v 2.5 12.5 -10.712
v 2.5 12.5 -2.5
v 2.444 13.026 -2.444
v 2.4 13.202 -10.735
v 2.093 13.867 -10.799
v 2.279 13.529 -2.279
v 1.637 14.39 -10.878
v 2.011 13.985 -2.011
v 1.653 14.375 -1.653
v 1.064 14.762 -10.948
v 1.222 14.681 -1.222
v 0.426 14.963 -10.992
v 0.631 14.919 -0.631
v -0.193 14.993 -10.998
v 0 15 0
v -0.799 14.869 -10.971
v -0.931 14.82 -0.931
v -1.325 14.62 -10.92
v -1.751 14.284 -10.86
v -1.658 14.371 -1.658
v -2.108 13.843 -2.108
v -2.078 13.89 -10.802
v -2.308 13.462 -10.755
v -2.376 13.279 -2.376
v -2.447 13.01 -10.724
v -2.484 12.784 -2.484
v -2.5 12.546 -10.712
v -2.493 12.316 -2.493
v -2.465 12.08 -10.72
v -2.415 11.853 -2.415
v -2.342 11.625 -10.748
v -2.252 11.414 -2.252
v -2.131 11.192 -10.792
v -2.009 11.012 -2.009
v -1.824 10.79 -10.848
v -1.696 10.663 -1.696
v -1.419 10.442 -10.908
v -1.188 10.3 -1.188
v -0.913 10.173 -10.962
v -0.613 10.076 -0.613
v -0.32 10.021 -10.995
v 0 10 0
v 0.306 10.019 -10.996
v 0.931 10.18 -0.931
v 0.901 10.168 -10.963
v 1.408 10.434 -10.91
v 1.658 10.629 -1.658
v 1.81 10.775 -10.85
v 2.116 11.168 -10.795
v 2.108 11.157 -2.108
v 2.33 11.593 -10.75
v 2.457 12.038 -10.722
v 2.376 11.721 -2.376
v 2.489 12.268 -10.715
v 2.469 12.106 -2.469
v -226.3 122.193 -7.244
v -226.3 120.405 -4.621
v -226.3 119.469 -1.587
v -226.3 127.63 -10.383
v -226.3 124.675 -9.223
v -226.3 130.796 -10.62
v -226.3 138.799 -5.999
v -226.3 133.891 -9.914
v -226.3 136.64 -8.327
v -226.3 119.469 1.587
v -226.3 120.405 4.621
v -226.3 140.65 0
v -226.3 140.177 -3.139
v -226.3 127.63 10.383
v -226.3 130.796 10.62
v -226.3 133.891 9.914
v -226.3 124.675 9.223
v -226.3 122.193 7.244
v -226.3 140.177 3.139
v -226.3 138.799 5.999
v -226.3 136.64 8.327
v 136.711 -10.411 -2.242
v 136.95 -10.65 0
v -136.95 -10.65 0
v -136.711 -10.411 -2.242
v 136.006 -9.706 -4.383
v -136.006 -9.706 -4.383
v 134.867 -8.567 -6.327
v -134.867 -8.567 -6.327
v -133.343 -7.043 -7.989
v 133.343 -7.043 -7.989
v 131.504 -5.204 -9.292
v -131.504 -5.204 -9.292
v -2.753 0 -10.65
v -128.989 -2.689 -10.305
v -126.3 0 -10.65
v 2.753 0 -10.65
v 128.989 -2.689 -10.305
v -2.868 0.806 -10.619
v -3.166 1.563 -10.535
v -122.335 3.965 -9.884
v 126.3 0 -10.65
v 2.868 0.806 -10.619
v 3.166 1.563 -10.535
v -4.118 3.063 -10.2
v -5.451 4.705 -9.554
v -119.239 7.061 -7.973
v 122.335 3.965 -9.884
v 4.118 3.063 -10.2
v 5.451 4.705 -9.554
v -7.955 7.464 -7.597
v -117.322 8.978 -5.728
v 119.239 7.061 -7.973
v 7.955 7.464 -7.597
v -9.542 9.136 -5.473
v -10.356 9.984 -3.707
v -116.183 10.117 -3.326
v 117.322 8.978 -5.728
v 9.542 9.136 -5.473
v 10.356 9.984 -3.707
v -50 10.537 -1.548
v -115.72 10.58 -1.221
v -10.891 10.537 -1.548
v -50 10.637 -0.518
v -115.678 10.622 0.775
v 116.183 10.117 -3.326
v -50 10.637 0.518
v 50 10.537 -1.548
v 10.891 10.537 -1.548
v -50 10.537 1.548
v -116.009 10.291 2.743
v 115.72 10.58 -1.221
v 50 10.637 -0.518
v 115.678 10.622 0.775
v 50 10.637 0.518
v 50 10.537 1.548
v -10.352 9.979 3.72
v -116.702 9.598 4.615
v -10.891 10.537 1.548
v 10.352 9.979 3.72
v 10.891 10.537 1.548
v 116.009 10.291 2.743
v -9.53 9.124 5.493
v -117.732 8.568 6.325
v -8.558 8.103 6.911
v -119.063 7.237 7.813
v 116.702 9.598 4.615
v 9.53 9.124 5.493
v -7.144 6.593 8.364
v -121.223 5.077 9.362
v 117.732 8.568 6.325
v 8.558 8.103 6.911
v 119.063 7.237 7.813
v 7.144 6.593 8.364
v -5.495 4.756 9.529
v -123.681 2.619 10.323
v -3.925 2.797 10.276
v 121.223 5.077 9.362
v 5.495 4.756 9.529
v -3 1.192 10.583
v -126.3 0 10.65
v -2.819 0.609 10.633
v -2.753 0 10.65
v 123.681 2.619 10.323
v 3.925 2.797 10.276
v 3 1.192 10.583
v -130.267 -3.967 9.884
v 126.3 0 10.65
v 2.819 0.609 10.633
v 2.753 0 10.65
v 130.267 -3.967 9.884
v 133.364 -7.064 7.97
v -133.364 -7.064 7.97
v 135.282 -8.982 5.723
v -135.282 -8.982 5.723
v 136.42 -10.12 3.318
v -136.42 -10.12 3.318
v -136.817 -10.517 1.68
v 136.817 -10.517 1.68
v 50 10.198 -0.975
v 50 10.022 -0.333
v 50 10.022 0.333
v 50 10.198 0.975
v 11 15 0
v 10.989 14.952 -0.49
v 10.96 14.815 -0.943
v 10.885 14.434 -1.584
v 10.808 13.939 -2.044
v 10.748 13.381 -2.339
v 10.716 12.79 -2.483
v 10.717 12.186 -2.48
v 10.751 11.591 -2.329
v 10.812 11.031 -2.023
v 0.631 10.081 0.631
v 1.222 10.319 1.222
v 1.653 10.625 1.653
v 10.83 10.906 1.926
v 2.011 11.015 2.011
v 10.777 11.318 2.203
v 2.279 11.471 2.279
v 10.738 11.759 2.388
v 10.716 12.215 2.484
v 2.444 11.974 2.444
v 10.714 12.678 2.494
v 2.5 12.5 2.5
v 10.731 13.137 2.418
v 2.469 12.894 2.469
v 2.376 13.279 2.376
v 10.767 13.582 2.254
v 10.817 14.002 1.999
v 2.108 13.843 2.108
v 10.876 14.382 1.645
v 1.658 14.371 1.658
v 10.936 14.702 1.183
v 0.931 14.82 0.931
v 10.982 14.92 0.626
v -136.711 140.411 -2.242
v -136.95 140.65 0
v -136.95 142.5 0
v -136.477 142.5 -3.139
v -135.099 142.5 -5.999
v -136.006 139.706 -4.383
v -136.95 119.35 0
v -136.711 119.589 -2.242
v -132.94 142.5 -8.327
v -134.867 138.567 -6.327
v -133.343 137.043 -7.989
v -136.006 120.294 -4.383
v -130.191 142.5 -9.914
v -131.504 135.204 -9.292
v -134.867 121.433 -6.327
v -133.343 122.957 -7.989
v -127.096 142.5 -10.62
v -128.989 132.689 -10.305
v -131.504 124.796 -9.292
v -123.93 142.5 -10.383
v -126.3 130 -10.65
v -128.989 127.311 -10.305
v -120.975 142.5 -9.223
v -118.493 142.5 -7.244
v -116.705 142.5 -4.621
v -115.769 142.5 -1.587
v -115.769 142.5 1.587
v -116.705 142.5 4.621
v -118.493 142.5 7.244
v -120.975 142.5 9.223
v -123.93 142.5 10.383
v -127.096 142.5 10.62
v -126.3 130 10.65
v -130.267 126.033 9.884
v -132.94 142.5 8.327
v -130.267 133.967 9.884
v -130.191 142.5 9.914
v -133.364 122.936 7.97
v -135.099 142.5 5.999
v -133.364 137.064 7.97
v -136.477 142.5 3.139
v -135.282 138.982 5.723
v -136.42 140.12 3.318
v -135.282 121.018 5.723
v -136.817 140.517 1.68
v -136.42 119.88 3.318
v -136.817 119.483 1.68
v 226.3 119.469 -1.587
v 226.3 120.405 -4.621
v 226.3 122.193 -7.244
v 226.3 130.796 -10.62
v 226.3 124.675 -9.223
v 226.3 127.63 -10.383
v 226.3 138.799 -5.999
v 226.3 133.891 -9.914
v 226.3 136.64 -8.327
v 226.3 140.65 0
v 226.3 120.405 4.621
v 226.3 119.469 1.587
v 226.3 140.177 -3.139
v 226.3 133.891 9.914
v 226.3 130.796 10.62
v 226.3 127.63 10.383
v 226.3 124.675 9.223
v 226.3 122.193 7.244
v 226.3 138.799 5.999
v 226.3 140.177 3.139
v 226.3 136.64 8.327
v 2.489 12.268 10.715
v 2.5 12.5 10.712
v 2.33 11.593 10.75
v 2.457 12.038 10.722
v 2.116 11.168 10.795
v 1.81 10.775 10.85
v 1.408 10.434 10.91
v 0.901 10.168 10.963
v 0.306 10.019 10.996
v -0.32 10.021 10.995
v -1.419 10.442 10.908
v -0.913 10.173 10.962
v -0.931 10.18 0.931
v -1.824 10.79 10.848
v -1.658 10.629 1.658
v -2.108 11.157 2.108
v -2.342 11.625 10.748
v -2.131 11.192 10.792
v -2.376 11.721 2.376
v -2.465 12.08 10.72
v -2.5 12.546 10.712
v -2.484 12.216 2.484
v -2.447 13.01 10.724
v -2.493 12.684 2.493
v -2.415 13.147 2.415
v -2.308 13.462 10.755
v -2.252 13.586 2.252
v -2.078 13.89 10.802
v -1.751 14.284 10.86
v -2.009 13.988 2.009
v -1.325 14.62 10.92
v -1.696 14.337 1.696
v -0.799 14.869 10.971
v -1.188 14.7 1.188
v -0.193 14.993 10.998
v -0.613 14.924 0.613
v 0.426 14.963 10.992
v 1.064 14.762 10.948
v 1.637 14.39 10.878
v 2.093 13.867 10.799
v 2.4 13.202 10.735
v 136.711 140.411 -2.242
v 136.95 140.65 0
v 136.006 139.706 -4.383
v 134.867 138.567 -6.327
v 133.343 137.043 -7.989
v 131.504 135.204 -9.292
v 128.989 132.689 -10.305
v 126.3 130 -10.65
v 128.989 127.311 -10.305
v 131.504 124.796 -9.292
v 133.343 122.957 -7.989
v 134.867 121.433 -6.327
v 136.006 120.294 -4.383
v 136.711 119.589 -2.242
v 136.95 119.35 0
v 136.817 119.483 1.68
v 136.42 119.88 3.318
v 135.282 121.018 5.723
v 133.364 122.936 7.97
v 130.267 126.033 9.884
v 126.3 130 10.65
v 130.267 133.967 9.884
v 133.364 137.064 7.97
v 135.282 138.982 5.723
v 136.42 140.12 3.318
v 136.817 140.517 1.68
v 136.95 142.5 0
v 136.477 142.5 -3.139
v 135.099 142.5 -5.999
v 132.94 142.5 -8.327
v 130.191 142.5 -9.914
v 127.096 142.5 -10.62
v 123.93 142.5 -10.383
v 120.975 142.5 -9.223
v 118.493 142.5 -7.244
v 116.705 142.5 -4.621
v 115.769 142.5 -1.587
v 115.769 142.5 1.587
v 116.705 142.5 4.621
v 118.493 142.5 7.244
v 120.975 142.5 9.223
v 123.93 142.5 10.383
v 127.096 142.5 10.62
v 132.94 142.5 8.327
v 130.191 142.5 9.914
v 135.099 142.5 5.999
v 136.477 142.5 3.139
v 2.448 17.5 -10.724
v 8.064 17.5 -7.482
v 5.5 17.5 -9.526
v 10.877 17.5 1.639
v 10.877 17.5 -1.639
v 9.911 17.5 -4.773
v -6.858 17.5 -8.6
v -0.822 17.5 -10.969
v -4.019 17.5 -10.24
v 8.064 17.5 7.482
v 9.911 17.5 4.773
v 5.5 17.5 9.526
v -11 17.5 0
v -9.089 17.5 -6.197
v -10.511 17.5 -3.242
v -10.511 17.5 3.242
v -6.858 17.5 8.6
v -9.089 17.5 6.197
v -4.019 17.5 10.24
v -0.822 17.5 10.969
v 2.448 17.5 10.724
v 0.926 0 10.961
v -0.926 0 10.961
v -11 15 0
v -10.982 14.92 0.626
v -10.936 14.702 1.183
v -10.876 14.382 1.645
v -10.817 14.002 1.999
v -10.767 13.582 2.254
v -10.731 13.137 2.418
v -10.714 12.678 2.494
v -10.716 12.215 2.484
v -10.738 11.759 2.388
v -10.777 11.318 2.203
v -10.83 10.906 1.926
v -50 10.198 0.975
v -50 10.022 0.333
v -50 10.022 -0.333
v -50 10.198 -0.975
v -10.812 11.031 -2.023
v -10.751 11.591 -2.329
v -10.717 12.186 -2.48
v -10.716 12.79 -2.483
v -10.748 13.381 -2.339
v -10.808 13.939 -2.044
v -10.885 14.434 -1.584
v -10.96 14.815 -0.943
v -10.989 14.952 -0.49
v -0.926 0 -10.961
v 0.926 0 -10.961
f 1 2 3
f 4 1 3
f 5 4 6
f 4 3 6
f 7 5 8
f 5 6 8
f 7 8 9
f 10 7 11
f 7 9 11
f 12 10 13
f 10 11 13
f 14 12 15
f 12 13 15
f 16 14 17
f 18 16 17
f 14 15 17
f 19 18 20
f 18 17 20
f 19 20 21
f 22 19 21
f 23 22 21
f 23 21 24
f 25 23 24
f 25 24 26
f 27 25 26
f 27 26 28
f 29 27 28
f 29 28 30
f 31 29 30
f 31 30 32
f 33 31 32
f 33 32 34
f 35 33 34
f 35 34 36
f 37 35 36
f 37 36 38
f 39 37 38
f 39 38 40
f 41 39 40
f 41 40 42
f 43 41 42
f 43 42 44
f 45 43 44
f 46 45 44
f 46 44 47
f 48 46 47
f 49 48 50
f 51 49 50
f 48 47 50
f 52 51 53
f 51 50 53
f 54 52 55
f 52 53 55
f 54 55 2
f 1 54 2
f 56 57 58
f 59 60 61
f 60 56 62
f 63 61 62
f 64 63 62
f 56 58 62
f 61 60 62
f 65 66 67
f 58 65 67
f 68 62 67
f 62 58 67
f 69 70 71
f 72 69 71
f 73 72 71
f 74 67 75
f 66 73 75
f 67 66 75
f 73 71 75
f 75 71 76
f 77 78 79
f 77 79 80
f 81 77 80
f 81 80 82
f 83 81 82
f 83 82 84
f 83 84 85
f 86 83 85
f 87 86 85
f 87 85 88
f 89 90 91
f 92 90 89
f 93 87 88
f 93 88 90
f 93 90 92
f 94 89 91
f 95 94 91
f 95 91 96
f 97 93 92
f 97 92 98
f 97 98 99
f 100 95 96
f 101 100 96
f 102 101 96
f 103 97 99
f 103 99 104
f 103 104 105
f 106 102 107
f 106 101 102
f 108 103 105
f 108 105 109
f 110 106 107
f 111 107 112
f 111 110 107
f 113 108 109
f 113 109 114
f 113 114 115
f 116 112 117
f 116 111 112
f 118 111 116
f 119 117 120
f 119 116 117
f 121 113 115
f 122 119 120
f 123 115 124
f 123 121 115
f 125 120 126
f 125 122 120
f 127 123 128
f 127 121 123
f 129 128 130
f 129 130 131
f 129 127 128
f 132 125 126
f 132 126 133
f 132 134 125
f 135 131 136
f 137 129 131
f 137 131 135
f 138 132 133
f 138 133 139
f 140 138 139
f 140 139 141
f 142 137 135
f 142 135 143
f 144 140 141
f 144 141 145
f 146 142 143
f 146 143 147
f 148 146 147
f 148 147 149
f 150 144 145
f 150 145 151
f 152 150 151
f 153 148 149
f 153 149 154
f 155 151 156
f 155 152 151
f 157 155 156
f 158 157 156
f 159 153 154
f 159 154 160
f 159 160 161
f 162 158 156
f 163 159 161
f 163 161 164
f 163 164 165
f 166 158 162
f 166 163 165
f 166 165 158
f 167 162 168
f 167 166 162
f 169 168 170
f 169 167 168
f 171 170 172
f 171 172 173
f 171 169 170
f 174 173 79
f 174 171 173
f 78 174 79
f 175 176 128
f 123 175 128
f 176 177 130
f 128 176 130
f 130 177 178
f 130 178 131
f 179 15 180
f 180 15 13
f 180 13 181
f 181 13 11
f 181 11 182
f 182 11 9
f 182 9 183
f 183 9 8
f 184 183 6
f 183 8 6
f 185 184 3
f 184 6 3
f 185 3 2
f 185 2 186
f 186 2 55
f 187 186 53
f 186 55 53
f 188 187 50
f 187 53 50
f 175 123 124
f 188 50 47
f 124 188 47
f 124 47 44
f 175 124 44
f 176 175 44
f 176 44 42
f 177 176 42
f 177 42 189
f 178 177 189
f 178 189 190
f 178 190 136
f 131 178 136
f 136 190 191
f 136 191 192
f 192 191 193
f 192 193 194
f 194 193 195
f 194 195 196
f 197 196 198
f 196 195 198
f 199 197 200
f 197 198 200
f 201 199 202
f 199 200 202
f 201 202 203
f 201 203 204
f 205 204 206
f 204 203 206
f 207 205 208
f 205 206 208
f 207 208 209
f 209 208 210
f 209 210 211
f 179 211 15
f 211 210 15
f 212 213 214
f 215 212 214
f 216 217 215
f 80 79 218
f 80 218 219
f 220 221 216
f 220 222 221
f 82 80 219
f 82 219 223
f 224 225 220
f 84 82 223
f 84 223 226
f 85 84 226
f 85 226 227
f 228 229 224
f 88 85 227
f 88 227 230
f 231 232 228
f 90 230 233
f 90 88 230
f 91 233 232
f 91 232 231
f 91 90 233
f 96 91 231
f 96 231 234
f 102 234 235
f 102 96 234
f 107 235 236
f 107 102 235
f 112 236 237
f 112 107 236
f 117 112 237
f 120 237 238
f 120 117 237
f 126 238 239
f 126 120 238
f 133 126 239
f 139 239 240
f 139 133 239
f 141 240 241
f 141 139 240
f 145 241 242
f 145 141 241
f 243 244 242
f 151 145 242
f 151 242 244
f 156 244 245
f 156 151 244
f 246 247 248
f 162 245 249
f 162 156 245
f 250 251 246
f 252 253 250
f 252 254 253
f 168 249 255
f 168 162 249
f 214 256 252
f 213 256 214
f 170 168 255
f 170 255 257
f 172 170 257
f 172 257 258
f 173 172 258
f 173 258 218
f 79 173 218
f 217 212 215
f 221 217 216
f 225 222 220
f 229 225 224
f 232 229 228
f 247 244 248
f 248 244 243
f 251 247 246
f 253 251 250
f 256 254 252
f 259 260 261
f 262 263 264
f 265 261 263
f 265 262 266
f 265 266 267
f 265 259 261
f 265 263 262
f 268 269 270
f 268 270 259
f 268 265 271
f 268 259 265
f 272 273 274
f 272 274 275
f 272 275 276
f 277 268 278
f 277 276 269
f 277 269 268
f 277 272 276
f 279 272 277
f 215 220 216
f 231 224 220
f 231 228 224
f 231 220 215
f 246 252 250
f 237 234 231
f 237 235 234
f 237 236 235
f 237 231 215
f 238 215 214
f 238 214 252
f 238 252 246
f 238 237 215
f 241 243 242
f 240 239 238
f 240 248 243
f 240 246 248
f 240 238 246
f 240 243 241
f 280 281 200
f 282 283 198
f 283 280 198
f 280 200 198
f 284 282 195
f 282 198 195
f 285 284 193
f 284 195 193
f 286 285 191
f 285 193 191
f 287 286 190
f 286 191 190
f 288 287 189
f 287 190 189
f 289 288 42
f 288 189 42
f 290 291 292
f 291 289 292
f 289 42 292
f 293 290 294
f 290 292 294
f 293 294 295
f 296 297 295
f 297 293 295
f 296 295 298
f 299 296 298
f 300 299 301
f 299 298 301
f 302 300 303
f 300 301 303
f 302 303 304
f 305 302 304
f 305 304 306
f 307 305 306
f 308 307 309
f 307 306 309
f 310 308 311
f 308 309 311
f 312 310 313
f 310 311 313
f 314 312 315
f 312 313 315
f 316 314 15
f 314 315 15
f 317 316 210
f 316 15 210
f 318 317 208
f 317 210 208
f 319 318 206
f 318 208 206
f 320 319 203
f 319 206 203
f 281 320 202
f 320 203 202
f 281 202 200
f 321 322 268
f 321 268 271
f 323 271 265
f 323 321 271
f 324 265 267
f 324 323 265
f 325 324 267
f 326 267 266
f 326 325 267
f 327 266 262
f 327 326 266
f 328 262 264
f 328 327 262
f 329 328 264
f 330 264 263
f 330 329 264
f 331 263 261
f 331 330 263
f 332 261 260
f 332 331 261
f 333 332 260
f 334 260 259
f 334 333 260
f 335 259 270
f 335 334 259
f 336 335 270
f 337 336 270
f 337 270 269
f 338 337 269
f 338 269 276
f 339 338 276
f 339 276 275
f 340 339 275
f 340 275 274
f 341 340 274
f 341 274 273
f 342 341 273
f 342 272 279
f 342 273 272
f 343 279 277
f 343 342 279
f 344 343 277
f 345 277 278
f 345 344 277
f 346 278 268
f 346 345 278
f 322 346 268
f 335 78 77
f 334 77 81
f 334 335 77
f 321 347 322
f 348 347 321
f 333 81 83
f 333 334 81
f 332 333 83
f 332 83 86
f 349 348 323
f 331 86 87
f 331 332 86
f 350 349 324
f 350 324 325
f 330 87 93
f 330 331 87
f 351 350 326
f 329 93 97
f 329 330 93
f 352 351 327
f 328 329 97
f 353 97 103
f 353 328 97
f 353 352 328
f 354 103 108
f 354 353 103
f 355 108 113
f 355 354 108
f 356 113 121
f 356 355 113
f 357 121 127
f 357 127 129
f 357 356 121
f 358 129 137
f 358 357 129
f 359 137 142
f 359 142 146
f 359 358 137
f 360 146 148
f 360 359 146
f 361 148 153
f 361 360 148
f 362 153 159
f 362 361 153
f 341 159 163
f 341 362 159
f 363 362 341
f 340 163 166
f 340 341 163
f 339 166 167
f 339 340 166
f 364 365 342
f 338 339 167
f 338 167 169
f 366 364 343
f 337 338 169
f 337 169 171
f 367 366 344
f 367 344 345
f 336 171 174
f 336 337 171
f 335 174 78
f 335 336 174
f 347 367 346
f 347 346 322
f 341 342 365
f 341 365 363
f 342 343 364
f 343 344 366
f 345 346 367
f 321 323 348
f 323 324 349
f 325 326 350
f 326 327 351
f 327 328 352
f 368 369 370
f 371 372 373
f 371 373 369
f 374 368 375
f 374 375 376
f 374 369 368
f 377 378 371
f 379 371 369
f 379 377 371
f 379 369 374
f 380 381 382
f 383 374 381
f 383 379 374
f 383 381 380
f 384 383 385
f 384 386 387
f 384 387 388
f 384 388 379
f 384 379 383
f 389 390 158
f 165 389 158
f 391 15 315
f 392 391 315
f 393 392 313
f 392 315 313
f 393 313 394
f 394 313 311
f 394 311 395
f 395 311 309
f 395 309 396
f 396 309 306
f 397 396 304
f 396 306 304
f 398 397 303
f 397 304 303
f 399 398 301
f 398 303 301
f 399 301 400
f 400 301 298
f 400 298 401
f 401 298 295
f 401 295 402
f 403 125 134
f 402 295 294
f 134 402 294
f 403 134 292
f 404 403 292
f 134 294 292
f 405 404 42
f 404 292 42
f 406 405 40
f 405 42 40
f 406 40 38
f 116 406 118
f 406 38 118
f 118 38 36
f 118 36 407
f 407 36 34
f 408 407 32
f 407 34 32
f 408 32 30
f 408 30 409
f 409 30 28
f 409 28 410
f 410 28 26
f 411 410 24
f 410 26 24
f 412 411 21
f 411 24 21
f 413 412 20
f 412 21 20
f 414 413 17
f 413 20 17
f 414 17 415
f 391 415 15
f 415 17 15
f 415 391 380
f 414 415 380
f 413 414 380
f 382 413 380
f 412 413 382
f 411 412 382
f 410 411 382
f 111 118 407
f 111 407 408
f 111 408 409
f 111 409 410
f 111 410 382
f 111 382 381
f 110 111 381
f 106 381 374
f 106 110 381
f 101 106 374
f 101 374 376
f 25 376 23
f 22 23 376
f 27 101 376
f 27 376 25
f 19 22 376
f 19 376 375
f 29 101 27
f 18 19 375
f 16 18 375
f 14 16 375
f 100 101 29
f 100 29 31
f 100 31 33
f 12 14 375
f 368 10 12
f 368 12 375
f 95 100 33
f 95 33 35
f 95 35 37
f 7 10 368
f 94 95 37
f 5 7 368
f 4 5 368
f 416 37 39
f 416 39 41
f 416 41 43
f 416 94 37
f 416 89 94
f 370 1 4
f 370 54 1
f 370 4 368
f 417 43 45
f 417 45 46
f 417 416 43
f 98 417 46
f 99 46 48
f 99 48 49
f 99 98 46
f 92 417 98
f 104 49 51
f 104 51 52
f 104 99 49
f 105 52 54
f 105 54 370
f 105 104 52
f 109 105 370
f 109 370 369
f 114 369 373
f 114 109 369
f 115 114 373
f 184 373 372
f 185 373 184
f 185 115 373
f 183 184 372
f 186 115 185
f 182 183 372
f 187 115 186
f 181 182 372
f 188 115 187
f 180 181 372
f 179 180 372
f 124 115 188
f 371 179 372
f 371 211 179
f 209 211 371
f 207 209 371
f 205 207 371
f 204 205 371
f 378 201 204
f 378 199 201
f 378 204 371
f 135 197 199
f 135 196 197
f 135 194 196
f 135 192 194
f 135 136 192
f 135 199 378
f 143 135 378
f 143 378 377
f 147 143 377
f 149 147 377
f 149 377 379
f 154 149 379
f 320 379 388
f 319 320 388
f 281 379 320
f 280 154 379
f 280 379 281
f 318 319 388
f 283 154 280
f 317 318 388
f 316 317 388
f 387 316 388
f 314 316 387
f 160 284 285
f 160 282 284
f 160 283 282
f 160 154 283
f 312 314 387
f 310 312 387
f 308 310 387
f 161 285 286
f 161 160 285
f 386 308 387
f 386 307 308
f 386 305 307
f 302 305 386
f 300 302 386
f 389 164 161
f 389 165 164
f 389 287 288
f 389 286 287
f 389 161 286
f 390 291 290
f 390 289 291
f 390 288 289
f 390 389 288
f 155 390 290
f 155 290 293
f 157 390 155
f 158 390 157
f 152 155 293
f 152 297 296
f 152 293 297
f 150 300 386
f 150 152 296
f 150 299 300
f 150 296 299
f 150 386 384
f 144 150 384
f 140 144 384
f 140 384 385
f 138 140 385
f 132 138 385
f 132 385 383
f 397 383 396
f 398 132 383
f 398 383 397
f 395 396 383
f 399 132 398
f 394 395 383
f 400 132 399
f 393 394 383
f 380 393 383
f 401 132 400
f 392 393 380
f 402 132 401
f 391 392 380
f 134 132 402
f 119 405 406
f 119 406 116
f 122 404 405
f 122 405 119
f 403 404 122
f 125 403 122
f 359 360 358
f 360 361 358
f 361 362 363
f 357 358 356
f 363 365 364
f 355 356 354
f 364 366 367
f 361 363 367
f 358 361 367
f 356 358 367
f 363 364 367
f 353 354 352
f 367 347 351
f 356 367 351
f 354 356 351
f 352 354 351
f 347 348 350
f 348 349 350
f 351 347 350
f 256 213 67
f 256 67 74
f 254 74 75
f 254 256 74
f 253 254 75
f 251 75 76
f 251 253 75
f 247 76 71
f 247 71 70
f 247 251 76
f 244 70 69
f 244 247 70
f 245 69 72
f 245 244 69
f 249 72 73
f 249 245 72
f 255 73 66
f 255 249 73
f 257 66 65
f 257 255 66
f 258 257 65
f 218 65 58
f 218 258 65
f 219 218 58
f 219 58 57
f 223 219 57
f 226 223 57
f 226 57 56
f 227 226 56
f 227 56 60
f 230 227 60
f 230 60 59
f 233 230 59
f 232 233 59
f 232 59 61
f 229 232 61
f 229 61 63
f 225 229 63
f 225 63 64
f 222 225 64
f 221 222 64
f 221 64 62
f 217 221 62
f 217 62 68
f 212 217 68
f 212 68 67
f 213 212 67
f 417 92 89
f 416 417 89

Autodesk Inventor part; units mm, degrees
sketch "Sketch1" plane through (0, 0, 0) normal (0, 0, 1) x (1, 0, 0)
  line L0 (-126.3, 0) -> (126.3, 0)
  line L1 (126.3, 0) -> (126.3, 142.5)
  line L2 (126.3, 0) -> (268.8, 0) construction
  line L3 (-126.3, 0) -> (-126.3, 142.5)
  point P0 (0, 0)
  dimension "d0" = 252.6
  dimension "d1" = 142.5
  dimension "d2" = 90
  dimension "d3" = 142.5
ref_plane "Work Plane1" through (-126.3, 142.5, 0) normal (0, 1, 0) x (-1, 0, 0)
sketch "Sketch2" plane through (-126.3, 142.5, 0) normal (0, 1, 0) x (-1, 0, 0)
  circle A0 centre (0, 0) radius 10.65
  point P0 (-126.3, 0)
  dimension "d4" = 21.3
sweep "Sweep1" add profiles "Sketch2" path "Sketch1"
ref_plane "Work Plane2" through (0, 0, 0) normal (0, 1, 0) x (-1, 0, 0)
sketch "Sketch3" plane through (0, 0, 0) normal (0, 1, 0) x (-1, 0, 0)
  circle A0 centre (0, 0) radius 11
  dimension "d8" = 22
extrude "Extrusion1" add sketch "Sketch3" along normal blind 17.5
ref_plane "Work Plane3" through (0, 0, 0) normal (0, 0, 1) x (1, 0, 0)
sketch "Sketch4" plane through (0, 0, 0) normal (0, 0, 1) x (1, 0, 0)
  circle A0 centre (0, 12.5) radius 2.5
  point P0 (0, 0)
  dimension "d12" = 5
extrude "Extrusion2" cut sketch "Sketch4" along normal mid plane 100
ref_plane "Work Plane4" through (0, 0, 0) normal (1, 0, 0) x (0, 1, 0)
sketch "Sketch5" plane through (0, 0, 0) normal (1, 0, 0) x (0, 1, 0)
  circle A0 centre (12.5, 0) radius 2.5
  point P0 (0, 0)
  dimension "d16" = 5
extrude "Extrusion3" cut sketch "Sketch5" along normal mid plane 100
sketch "Sketch6" plane through (-126.3, 142.5, 0) normal (0, 1, 0) x (1, 0, 0)
  circle A0 centre (0, 0) radius 10.65 projected
  point P0 (126.3, 0)
sketch "Sketch7" plane through (126.3, 142.5, 0) normal (0, 1, 0) x (1, 0, 0)
  circle A0 centre (0, 0) radius 10.65 projected
  point P0 (-126.3, 0)
ref_plane "Work Plane6" through (126.3, 0, 0) normal (1, 0, 0) x (0, 1, 0)
ref_plane "Work Plane7" through (-126.3, 0, 0) normal (1, 0, 0) x (0, 1, 0)
sketch "Sketch8" plane through (-126.3, 0, 0) normal (1, 0, 0) x (0, 1, 0)
  line L0 (142.5, -10.65) -> (142.5, 10.65) projected
  circle A0 centre (130, 0) radius 10.65
  point P0 (0, 0)
  point P1 (142.5, 0)
  dimension "d21" = 21.3
extrude "Extrusion4" add sketch "Sketch8" against normal blind 100
sketch "Sketch9" plane through (126.3, 0, 0) normal (1, 0, 0) x (0, 1, 0)
  circle A0 centre (130, 0) radius 10.65 projected
  circle A1 centre (130, 0) radius 10.65
  point P0 (0, 0)
extrude "Extrusion5" add sketch "Sketch9" along normal blind 100
properties part number "hands" material "PVC-Piping"
